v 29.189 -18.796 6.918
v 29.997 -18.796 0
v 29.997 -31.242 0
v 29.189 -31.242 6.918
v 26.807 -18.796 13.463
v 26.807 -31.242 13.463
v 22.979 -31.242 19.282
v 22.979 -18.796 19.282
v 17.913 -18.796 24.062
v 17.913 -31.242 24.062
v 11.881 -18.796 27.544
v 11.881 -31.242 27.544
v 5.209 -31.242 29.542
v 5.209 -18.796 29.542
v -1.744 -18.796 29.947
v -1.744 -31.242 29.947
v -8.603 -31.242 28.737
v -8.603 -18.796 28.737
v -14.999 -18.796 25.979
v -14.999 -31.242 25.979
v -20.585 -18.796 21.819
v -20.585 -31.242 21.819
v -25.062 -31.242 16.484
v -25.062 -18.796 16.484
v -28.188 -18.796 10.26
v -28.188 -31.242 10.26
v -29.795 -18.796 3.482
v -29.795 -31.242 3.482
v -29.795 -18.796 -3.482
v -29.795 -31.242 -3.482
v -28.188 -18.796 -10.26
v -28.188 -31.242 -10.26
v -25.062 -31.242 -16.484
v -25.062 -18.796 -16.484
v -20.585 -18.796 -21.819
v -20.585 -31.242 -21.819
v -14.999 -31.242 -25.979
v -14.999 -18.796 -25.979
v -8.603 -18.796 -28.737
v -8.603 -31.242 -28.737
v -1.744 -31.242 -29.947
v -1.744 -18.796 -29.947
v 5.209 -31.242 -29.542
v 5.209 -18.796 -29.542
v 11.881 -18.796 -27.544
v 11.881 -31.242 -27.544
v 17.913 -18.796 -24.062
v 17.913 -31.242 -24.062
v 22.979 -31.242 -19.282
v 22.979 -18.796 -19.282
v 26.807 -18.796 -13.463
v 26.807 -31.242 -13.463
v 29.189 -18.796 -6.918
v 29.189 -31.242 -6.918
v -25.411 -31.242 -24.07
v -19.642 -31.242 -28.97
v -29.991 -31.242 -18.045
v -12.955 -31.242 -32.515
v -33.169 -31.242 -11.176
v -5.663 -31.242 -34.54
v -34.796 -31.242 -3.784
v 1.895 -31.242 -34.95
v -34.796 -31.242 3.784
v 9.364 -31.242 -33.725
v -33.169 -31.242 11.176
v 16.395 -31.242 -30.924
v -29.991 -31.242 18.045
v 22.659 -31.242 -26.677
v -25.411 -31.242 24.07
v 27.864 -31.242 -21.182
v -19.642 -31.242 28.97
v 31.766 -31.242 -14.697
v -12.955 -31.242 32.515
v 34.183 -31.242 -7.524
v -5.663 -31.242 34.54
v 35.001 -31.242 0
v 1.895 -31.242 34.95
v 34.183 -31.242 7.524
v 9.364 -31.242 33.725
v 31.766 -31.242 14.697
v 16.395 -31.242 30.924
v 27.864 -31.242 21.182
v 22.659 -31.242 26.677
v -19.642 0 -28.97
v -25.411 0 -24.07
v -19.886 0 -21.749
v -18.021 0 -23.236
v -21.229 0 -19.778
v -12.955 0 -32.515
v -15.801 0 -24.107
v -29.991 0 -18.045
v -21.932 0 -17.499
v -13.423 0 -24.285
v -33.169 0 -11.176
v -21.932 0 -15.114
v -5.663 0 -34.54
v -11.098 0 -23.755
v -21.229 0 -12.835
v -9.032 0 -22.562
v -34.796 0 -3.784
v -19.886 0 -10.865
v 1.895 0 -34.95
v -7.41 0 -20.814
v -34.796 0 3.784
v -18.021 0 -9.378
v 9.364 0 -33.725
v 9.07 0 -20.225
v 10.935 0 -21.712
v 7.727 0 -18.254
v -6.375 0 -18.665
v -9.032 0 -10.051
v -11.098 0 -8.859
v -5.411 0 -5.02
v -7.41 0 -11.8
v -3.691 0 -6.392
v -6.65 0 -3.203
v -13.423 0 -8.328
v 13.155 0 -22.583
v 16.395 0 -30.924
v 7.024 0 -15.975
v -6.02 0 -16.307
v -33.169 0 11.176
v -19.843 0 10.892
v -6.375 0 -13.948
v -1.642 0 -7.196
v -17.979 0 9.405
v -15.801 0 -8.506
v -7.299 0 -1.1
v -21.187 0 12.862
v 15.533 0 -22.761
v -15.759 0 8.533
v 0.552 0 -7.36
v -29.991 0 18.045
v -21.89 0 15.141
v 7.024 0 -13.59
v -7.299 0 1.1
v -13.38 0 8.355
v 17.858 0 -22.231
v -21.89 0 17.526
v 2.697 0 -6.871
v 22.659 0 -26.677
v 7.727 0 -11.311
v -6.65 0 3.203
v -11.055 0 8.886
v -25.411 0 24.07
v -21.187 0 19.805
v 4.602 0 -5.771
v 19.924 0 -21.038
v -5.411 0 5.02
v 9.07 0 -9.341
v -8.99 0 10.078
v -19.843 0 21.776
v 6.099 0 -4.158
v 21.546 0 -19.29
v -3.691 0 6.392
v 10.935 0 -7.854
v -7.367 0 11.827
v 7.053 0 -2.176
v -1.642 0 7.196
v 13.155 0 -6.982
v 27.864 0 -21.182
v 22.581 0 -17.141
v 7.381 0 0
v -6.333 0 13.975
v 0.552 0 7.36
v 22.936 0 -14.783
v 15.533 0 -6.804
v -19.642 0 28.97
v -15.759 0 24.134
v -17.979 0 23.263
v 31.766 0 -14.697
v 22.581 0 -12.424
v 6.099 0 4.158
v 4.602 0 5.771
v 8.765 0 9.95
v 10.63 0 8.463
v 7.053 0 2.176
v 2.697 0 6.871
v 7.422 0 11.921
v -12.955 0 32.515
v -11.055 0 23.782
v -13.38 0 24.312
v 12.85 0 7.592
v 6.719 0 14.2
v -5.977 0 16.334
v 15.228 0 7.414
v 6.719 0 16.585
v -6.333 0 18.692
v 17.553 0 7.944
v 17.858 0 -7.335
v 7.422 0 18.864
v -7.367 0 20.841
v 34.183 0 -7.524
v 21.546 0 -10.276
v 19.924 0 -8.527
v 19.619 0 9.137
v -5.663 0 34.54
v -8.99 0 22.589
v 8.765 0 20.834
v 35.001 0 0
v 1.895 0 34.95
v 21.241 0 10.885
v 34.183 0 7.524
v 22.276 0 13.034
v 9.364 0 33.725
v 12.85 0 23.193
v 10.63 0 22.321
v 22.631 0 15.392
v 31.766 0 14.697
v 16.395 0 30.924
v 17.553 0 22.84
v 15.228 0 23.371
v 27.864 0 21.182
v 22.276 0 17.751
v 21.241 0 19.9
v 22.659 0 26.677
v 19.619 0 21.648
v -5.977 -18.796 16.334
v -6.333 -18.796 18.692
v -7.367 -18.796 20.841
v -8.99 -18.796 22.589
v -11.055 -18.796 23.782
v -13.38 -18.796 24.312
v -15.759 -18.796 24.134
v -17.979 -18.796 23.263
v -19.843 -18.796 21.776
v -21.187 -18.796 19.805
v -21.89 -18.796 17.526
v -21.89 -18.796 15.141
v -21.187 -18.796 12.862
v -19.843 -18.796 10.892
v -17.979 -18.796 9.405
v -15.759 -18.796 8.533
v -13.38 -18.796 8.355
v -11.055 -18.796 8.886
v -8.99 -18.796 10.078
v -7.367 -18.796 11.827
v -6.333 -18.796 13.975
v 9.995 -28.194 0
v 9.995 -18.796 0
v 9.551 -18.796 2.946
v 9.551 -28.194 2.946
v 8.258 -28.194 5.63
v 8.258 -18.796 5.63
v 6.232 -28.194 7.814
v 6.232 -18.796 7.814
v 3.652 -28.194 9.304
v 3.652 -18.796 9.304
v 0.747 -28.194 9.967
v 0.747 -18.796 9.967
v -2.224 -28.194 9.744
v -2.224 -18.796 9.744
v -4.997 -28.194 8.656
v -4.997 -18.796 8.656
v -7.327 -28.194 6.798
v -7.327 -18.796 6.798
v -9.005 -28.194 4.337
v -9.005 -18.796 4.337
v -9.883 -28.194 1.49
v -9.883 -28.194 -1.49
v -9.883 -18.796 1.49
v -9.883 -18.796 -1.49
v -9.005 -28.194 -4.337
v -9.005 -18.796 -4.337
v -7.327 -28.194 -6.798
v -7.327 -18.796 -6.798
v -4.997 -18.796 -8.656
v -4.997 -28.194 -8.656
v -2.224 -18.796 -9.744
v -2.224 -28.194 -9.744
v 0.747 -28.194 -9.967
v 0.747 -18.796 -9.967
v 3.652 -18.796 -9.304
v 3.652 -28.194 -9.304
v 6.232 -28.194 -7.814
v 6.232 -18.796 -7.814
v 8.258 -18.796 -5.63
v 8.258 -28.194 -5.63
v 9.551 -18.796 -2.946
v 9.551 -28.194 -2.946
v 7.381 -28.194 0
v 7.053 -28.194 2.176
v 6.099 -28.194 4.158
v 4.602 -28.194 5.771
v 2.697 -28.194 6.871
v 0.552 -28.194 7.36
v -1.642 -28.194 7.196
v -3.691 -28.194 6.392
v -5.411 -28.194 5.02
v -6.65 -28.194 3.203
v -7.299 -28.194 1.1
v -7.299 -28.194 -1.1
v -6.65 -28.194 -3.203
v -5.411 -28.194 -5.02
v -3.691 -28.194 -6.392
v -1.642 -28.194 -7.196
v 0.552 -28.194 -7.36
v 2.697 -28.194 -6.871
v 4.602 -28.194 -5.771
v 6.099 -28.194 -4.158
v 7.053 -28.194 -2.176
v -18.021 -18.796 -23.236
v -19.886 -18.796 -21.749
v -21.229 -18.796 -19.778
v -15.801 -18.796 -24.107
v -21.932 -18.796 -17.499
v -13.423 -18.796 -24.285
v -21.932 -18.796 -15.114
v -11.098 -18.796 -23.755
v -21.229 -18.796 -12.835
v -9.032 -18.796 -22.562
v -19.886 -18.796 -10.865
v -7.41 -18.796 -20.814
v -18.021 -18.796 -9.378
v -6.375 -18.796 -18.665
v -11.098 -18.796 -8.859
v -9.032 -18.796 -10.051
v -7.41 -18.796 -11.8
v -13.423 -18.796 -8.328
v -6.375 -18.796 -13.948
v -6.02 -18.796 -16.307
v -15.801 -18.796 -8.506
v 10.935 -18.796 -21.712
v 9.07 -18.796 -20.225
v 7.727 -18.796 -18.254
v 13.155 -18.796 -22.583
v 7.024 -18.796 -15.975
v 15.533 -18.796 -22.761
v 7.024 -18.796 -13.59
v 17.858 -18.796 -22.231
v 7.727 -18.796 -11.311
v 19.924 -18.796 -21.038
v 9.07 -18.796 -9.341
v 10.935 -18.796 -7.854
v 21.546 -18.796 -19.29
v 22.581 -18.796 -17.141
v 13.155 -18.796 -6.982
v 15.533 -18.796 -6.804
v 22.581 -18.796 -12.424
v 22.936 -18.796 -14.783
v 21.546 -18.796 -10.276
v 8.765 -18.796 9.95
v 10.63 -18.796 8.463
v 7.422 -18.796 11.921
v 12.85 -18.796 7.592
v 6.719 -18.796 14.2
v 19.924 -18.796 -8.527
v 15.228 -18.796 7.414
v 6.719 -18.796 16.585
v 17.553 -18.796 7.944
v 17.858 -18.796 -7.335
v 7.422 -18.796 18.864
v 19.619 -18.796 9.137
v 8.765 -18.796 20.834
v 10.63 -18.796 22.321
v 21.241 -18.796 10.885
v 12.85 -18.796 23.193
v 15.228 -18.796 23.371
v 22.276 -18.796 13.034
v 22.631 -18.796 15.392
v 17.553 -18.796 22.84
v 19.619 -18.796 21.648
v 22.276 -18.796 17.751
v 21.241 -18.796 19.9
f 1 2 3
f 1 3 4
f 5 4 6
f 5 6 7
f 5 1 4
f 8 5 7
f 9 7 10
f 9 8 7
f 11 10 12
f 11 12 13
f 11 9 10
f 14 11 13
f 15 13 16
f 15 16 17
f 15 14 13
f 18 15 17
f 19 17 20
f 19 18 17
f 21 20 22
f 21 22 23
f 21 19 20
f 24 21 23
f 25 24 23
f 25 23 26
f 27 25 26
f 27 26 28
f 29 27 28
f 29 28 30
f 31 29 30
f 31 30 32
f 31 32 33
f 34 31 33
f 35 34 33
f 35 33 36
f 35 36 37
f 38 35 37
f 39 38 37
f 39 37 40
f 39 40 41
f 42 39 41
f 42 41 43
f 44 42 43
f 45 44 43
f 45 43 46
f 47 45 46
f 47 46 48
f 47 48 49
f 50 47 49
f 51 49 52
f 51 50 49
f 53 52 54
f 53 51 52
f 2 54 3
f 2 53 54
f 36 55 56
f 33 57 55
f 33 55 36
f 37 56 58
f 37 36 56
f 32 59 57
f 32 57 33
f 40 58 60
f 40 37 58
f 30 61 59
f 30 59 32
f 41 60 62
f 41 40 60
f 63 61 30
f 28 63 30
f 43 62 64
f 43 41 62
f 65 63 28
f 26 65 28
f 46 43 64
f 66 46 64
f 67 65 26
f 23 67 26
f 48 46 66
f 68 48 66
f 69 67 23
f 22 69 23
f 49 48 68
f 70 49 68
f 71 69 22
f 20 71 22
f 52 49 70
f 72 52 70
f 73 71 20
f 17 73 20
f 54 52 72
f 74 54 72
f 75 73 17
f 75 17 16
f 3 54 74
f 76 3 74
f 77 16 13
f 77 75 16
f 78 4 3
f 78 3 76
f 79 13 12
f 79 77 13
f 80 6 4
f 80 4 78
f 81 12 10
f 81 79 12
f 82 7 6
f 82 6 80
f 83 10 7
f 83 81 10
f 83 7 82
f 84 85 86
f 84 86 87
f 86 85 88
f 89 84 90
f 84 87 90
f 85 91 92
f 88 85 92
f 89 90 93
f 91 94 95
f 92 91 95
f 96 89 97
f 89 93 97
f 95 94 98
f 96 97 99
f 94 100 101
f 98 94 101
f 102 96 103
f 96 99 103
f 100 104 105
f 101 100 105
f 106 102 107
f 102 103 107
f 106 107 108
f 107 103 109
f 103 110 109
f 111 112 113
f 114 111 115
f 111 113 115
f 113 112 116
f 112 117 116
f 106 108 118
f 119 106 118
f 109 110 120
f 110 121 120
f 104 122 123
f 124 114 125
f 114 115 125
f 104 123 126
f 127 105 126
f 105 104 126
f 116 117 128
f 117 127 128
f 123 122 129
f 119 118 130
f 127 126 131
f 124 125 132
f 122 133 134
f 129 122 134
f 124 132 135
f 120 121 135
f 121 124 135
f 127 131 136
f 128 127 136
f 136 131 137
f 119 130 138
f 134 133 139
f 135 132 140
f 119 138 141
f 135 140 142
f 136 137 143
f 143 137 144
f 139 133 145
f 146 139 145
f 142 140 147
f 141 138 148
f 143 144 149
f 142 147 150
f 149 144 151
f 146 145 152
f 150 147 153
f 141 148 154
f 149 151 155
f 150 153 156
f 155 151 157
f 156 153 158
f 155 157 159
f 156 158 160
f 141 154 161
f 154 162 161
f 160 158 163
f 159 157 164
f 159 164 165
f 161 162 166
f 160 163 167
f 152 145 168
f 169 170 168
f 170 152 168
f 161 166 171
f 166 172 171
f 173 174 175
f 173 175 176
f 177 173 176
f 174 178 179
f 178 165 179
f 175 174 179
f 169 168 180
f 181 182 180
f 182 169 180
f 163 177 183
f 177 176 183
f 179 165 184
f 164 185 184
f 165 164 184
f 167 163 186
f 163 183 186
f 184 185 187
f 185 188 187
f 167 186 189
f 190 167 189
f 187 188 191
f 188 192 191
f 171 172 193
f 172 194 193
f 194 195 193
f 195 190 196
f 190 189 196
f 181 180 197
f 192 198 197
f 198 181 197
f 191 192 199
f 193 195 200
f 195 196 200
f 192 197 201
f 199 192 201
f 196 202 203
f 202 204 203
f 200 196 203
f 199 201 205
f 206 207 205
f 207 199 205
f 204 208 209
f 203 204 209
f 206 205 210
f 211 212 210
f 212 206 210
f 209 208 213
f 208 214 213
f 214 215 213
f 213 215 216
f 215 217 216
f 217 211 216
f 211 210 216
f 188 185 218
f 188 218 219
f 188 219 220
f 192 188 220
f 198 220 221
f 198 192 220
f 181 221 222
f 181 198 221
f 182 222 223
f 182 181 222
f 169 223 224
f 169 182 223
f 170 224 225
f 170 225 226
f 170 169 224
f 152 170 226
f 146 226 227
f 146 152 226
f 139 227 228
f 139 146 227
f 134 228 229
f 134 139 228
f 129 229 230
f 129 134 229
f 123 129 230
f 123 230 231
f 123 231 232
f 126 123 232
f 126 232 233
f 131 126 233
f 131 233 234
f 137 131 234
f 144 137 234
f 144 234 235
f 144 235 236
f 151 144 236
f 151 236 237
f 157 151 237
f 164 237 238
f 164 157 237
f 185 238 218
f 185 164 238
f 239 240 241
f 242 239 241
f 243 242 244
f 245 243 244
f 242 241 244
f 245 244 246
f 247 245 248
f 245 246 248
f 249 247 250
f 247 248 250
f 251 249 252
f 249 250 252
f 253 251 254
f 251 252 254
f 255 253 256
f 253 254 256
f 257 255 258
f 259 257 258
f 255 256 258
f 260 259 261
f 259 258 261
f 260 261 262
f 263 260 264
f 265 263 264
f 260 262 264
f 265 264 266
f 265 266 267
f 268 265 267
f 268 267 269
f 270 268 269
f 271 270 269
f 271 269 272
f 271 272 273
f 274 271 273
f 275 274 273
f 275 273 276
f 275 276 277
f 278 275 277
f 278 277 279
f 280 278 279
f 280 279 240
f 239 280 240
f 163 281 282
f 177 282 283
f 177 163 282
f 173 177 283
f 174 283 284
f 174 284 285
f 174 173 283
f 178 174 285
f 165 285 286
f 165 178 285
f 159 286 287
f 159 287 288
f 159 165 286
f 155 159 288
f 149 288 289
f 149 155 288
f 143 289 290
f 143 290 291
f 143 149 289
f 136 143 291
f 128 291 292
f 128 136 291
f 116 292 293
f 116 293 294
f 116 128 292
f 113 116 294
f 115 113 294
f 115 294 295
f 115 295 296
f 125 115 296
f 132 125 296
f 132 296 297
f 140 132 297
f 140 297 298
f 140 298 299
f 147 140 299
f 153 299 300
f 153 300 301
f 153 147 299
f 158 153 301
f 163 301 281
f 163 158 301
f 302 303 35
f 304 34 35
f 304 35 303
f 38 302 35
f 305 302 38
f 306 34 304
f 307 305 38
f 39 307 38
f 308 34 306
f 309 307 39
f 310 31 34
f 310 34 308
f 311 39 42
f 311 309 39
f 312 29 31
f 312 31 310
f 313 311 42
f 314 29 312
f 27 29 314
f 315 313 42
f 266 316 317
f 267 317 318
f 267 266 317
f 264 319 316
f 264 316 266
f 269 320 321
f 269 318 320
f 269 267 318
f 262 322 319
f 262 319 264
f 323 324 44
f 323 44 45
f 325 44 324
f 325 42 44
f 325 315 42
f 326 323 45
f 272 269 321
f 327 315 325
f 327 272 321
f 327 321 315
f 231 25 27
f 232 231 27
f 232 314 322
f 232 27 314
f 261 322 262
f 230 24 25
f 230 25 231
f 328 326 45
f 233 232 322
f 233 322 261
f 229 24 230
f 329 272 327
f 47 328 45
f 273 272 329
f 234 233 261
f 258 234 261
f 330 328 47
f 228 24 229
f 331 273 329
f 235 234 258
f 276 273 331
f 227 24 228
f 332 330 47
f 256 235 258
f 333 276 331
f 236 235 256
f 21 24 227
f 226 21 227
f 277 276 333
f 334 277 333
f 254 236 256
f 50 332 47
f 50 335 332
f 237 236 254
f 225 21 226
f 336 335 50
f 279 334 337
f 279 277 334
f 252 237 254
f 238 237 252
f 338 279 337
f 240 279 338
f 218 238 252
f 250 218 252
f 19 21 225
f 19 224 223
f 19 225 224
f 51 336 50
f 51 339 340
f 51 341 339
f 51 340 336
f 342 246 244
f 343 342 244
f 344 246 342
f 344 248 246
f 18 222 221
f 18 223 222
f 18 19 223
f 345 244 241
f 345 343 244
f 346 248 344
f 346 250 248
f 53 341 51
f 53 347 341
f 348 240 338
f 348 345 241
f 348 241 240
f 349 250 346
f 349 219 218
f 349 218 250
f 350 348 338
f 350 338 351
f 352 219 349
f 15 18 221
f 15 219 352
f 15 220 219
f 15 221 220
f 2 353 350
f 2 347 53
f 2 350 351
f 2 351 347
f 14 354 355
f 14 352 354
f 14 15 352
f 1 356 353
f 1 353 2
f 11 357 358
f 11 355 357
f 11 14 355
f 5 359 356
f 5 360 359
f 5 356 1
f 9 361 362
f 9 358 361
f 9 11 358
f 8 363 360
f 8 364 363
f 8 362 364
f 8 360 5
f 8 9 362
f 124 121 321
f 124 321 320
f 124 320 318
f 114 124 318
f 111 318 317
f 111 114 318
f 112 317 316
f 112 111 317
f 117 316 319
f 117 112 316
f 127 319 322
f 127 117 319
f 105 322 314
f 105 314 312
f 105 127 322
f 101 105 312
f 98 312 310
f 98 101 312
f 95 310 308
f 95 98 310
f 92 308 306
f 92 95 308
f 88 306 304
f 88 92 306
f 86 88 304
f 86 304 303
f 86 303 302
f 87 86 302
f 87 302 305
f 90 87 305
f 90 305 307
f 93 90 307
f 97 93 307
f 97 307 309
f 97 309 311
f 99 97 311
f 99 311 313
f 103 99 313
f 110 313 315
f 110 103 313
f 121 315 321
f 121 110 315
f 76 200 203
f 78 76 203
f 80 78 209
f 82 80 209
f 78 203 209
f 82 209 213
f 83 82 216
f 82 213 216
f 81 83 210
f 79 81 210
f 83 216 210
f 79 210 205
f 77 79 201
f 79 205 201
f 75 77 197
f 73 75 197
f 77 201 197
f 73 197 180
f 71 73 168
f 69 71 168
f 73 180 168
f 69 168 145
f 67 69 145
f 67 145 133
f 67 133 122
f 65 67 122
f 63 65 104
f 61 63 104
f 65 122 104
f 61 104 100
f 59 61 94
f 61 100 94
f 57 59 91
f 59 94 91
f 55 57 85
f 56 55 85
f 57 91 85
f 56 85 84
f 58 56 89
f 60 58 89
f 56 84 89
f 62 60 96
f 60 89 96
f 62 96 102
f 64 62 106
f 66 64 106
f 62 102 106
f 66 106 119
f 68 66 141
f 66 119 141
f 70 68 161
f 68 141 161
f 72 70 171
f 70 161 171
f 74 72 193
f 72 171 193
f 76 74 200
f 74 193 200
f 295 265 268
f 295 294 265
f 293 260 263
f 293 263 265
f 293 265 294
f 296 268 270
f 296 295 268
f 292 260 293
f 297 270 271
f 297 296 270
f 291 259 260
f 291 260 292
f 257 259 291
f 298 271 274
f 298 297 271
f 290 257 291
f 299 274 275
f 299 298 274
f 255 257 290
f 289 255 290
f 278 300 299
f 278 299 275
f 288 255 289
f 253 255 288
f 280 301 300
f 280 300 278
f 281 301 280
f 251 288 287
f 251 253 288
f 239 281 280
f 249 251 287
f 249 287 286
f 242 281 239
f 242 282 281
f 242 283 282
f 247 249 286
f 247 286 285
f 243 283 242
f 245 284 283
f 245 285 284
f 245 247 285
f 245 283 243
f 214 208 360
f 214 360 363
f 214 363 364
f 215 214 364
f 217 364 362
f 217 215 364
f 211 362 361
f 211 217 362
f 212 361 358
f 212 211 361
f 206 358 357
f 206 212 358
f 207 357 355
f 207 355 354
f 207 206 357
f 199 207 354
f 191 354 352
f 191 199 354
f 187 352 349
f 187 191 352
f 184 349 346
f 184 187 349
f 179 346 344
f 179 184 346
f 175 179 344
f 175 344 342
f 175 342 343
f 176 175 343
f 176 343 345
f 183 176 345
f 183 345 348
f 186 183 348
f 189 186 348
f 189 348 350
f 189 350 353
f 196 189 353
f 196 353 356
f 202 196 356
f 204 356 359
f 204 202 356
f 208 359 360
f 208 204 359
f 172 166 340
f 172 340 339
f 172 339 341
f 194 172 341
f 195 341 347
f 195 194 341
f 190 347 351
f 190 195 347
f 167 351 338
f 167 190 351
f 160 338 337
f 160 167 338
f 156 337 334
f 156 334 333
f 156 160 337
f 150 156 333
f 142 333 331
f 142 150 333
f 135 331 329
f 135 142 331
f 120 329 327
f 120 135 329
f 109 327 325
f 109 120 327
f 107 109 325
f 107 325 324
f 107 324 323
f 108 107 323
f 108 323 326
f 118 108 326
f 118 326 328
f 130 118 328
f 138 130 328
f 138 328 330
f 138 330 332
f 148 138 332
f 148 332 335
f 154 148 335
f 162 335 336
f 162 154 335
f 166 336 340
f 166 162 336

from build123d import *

# Parameters (mm, degrees)
F0_R     = 35.0012
F0_R_2   = 29.9974
F1_DEPTH = 31.242
F0_R_3   = 8.001
F0_R_4   = 9.9949
F2_DEPTH = 18.796
F0_R_5   = 7.381132
F3_DEPTH = 28.194


with BuildPart() as f1:
    # F0 (on Front) → F1 (new body)
    with BuildSketch(Plane.XZ):
        Circle(F0_R)
        Circle(F0_R_2, mode=Mode.SUBTRACT)
    extrude(amount=F1_DEPTH)

    # F0 (on Front) → F2 (join)
    with BuildSketch(Plane.XZ):
        Circle(F0_R_2)
        with Locations((-14.0208, -16.306801)):
            Circle(F0_R_3, mode=Mode.SUBTRACT)
        with Locations((14.935198, -14.7828)):
            Circle(F0_R_3, mode=Mode.SUBTRACT)
        with Locations((-13.978204, 16.333792)):
            Circle(F0_R_3, mode=Mode.SUBTRACT)
        Circle(F0_R_4, mode=Mode.SUBTRACT)
        with Locations((14.630399, 15.3924)):
            Circle(F0_R_3, mode=Mode.SUBTRACT)
    extrude(amount=F2_DEPTH)

    # F0 (on Front) → F3 (join)
    with BuildSketch(Plane.XZ):
        Circle(F0_R_4)
        Circle(F0_R_5, mode=Mode.SUBTRACT)
    extrude(amount=F3_DEPTH)


solid = f1.part
